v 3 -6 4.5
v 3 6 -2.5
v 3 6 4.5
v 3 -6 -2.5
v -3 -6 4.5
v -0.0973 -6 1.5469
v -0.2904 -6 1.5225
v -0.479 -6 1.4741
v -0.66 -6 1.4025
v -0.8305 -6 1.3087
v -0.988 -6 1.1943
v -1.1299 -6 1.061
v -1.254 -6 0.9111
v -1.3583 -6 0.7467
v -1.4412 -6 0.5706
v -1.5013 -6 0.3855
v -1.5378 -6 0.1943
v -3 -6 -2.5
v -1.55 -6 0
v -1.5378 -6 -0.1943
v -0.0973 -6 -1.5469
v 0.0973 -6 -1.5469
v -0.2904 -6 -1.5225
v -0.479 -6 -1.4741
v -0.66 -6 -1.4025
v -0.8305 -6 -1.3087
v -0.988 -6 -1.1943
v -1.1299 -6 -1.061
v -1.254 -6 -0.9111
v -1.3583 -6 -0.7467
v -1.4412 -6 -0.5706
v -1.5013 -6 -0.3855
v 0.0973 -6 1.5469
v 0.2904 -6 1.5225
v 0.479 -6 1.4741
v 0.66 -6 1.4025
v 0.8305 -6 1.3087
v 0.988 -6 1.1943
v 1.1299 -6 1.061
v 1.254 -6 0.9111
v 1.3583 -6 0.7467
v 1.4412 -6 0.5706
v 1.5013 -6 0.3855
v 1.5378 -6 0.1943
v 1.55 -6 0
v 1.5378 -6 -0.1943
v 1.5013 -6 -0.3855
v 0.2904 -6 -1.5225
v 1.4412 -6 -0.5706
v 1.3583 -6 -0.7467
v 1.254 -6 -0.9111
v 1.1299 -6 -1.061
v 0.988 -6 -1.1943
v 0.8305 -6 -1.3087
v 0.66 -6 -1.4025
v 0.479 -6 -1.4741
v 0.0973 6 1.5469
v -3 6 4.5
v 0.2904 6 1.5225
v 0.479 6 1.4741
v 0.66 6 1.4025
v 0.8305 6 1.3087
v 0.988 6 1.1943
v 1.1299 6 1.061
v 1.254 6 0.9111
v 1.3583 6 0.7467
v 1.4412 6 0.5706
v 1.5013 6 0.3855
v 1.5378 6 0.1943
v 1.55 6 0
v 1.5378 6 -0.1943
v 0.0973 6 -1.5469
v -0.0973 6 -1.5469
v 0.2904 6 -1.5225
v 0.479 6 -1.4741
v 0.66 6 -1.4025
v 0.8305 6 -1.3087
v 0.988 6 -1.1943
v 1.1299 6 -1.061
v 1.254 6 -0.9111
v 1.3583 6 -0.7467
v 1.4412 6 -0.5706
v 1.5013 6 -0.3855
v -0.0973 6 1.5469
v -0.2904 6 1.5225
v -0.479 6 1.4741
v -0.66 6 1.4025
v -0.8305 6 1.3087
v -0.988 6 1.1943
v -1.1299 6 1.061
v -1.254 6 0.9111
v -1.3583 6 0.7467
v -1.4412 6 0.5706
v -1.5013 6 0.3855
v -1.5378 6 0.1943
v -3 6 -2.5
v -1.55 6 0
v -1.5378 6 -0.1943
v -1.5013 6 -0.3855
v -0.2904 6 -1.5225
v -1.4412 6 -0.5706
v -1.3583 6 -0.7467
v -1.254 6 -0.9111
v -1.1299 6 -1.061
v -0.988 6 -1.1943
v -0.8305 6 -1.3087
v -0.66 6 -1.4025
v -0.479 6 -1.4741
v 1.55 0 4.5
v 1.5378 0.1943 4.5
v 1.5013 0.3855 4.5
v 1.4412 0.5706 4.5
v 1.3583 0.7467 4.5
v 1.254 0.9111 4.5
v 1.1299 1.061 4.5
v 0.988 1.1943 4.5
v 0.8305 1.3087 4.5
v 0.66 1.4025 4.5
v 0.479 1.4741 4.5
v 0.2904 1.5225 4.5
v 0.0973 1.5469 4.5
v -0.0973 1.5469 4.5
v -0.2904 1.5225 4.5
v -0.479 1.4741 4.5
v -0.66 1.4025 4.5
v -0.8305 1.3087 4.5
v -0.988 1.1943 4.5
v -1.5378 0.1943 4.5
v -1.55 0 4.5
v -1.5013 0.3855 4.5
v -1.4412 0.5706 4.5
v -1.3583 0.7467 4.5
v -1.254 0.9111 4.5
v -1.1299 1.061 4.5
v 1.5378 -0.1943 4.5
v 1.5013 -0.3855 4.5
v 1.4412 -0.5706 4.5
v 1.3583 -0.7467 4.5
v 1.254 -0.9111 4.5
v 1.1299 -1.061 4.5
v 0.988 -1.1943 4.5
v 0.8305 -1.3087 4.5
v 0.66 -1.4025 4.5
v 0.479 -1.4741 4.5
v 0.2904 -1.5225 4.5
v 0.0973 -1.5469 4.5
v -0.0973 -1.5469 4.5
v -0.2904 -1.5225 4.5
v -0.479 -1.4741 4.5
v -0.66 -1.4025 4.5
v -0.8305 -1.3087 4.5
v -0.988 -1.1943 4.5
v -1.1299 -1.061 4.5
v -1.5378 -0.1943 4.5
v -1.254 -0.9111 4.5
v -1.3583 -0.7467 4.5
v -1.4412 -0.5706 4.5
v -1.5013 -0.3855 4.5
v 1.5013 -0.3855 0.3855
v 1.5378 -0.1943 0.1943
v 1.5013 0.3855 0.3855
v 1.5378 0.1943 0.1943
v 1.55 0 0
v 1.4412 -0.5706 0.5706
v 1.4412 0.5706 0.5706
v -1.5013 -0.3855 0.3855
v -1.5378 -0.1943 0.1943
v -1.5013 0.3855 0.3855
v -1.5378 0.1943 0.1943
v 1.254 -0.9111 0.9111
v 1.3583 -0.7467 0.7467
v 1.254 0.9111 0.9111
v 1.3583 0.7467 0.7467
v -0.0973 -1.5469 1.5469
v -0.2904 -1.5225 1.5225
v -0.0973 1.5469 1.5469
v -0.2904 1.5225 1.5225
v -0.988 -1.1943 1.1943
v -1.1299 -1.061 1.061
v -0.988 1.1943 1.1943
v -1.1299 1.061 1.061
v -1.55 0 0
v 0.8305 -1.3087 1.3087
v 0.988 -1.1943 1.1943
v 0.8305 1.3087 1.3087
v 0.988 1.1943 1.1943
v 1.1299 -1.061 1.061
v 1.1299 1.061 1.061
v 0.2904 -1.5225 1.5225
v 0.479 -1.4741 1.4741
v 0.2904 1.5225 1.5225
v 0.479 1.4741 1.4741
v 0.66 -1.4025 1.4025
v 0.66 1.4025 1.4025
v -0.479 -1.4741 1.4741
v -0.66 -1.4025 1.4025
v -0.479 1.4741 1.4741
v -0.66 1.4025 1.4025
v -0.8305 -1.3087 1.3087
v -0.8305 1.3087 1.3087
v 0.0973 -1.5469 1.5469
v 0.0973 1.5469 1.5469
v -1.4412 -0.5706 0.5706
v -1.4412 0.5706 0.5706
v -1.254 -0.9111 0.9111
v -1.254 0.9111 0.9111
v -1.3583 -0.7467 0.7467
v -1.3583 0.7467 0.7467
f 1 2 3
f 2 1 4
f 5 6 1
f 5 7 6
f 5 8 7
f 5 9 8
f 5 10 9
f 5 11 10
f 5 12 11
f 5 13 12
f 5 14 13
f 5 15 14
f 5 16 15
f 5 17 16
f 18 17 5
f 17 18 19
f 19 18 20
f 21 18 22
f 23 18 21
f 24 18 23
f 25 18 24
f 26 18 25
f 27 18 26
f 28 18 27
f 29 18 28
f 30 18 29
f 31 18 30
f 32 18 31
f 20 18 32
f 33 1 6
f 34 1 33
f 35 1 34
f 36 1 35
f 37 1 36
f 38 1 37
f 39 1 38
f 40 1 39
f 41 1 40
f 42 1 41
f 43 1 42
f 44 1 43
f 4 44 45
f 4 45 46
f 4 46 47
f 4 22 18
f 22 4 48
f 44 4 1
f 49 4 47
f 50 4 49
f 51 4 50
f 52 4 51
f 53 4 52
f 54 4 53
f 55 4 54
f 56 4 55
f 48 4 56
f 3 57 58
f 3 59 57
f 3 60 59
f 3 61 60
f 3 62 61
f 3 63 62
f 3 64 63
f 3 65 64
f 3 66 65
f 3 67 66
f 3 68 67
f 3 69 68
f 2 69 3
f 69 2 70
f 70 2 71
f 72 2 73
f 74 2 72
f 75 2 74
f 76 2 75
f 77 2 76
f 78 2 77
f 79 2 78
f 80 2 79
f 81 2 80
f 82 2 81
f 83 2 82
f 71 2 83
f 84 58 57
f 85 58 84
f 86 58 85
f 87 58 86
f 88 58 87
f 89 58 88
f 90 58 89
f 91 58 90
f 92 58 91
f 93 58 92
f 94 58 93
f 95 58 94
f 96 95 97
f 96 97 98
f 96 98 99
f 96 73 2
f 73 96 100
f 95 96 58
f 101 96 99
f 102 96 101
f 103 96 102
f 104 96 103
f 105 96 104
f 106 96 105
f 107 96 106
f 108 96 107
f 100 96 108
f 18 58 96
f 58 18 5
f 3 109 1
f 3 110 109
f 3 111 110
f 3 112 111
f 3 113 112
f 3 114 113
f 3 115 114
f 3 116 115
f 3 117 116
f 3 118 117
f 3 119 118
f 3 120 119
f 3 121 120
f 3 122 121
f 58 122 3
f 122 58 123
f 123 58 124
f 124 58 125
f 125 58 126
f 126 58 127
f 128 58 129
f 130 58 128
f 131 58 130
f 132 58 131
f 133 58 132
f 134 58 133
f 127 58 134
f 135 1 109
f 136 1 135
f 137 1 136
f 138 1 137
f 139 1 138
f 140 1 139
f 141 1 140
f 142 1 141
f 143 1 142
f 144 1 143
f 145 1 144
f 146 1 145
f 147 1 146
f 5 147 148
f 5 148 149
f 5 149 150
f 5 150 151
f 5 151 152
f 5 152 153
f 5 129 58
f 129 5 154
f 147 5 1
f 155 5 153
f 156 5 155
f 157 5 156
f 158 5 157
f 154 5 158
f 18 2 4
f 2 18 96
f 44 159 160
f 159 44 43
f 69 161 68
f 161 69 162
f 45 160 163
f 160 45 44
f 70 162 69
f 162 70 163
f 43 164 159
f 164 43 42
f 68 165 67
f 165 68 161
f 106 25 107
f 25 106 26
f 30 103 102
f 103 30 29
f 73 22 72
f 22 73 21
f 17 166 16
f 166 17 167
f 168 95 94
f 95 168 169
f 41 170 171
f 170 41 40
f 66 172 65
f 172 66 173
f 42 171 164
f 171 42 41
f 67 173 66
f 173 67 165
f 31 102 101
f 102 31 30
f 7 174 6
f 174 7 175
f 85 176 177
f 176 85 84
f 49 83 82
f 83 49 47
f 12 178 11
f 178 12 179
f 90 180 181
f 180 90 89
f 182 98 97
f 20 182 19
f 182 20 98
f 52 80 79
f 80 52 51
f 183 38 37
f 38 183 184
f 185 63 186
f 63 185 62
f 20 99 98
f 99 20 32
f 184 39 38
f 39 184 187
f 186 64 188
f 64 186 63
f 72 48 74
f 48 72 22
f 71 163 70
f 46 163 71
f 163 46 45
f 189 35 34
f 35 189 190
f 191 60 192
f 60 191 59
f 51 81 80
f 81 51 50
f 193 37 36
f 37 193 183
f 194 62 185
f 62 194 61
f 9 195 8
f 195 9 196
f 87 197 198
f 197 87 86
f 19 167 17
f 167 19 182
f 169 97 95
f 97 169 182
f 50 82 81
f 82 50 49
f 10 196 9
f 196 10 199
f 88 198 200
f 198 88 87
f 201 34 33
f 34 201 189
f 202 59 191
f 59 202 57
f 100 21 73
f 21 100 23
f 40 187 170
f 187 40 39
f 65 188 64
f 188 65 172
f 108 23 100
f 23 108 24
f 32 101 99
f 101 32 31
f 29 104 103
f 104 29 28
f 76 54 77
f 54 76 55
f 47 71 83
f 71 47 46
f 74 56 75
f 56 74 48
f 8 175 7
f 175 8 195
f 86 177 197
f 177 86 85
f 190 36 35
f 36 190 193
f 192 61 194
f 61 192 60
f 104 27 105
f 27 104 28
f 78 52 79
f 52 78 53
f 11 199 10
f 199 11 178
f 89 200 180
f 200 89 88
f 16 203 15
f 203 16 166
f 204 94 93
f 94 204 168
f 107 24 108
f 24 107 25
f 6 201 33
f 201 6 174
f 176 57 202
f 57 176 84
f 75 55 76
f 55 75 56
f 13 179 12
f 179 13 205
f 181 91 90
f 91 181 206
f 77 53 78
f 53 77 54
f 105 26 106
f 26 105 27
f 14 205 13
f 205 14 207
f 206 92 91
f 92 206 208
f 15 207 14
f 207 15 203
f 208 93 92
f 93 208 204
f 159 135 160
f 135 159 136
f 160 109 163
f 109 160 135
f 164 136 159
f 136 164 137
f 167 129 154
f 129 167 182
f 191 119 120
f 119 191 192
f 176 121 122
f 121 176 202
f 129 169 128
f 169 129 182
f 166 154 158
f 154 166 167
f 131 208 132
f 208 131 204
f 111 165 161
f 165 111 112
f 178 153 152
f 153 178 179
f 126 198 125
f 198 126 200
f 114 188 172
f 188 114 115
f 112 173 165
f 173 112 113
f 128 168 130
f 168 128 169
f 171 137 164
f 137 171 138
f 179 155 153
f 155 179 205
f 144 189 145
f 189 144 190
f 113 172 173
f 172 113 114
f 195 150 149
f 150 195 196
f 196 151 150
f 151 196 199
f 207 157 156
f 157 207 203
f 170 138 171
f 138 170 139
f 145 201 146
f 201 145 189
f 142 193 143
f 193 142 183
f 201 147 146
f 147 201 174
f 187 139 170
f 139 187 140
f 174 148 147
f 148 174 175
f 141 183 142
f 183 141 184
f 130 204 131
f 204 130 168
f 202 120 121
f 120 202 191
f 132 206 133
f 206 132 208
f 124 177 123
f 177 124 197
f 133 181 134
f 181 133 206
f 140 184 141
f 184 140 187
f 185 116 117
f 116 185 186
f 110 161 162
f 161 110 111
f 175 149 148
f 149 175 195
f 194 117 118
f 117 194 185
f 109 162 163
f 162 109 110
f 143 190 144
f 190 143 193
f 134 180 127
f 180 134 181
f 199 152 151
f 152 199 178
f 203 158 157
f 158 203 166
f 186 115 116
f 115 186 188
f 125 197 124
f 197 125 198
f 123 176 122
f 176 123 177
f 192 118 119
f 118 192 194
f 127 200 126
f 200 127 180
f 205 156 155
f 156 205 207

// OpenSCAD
$fn = 50;

rotate([90,0,0]) {
difference() {
translate([0,1,0]) cube([6, 7, 12], true);
cylinder(100,1.55,1.55, true);
translate([0, 5, 0]) rotate([90,0,0]) cylinder(10,1.55,1.55, true);
}
}
